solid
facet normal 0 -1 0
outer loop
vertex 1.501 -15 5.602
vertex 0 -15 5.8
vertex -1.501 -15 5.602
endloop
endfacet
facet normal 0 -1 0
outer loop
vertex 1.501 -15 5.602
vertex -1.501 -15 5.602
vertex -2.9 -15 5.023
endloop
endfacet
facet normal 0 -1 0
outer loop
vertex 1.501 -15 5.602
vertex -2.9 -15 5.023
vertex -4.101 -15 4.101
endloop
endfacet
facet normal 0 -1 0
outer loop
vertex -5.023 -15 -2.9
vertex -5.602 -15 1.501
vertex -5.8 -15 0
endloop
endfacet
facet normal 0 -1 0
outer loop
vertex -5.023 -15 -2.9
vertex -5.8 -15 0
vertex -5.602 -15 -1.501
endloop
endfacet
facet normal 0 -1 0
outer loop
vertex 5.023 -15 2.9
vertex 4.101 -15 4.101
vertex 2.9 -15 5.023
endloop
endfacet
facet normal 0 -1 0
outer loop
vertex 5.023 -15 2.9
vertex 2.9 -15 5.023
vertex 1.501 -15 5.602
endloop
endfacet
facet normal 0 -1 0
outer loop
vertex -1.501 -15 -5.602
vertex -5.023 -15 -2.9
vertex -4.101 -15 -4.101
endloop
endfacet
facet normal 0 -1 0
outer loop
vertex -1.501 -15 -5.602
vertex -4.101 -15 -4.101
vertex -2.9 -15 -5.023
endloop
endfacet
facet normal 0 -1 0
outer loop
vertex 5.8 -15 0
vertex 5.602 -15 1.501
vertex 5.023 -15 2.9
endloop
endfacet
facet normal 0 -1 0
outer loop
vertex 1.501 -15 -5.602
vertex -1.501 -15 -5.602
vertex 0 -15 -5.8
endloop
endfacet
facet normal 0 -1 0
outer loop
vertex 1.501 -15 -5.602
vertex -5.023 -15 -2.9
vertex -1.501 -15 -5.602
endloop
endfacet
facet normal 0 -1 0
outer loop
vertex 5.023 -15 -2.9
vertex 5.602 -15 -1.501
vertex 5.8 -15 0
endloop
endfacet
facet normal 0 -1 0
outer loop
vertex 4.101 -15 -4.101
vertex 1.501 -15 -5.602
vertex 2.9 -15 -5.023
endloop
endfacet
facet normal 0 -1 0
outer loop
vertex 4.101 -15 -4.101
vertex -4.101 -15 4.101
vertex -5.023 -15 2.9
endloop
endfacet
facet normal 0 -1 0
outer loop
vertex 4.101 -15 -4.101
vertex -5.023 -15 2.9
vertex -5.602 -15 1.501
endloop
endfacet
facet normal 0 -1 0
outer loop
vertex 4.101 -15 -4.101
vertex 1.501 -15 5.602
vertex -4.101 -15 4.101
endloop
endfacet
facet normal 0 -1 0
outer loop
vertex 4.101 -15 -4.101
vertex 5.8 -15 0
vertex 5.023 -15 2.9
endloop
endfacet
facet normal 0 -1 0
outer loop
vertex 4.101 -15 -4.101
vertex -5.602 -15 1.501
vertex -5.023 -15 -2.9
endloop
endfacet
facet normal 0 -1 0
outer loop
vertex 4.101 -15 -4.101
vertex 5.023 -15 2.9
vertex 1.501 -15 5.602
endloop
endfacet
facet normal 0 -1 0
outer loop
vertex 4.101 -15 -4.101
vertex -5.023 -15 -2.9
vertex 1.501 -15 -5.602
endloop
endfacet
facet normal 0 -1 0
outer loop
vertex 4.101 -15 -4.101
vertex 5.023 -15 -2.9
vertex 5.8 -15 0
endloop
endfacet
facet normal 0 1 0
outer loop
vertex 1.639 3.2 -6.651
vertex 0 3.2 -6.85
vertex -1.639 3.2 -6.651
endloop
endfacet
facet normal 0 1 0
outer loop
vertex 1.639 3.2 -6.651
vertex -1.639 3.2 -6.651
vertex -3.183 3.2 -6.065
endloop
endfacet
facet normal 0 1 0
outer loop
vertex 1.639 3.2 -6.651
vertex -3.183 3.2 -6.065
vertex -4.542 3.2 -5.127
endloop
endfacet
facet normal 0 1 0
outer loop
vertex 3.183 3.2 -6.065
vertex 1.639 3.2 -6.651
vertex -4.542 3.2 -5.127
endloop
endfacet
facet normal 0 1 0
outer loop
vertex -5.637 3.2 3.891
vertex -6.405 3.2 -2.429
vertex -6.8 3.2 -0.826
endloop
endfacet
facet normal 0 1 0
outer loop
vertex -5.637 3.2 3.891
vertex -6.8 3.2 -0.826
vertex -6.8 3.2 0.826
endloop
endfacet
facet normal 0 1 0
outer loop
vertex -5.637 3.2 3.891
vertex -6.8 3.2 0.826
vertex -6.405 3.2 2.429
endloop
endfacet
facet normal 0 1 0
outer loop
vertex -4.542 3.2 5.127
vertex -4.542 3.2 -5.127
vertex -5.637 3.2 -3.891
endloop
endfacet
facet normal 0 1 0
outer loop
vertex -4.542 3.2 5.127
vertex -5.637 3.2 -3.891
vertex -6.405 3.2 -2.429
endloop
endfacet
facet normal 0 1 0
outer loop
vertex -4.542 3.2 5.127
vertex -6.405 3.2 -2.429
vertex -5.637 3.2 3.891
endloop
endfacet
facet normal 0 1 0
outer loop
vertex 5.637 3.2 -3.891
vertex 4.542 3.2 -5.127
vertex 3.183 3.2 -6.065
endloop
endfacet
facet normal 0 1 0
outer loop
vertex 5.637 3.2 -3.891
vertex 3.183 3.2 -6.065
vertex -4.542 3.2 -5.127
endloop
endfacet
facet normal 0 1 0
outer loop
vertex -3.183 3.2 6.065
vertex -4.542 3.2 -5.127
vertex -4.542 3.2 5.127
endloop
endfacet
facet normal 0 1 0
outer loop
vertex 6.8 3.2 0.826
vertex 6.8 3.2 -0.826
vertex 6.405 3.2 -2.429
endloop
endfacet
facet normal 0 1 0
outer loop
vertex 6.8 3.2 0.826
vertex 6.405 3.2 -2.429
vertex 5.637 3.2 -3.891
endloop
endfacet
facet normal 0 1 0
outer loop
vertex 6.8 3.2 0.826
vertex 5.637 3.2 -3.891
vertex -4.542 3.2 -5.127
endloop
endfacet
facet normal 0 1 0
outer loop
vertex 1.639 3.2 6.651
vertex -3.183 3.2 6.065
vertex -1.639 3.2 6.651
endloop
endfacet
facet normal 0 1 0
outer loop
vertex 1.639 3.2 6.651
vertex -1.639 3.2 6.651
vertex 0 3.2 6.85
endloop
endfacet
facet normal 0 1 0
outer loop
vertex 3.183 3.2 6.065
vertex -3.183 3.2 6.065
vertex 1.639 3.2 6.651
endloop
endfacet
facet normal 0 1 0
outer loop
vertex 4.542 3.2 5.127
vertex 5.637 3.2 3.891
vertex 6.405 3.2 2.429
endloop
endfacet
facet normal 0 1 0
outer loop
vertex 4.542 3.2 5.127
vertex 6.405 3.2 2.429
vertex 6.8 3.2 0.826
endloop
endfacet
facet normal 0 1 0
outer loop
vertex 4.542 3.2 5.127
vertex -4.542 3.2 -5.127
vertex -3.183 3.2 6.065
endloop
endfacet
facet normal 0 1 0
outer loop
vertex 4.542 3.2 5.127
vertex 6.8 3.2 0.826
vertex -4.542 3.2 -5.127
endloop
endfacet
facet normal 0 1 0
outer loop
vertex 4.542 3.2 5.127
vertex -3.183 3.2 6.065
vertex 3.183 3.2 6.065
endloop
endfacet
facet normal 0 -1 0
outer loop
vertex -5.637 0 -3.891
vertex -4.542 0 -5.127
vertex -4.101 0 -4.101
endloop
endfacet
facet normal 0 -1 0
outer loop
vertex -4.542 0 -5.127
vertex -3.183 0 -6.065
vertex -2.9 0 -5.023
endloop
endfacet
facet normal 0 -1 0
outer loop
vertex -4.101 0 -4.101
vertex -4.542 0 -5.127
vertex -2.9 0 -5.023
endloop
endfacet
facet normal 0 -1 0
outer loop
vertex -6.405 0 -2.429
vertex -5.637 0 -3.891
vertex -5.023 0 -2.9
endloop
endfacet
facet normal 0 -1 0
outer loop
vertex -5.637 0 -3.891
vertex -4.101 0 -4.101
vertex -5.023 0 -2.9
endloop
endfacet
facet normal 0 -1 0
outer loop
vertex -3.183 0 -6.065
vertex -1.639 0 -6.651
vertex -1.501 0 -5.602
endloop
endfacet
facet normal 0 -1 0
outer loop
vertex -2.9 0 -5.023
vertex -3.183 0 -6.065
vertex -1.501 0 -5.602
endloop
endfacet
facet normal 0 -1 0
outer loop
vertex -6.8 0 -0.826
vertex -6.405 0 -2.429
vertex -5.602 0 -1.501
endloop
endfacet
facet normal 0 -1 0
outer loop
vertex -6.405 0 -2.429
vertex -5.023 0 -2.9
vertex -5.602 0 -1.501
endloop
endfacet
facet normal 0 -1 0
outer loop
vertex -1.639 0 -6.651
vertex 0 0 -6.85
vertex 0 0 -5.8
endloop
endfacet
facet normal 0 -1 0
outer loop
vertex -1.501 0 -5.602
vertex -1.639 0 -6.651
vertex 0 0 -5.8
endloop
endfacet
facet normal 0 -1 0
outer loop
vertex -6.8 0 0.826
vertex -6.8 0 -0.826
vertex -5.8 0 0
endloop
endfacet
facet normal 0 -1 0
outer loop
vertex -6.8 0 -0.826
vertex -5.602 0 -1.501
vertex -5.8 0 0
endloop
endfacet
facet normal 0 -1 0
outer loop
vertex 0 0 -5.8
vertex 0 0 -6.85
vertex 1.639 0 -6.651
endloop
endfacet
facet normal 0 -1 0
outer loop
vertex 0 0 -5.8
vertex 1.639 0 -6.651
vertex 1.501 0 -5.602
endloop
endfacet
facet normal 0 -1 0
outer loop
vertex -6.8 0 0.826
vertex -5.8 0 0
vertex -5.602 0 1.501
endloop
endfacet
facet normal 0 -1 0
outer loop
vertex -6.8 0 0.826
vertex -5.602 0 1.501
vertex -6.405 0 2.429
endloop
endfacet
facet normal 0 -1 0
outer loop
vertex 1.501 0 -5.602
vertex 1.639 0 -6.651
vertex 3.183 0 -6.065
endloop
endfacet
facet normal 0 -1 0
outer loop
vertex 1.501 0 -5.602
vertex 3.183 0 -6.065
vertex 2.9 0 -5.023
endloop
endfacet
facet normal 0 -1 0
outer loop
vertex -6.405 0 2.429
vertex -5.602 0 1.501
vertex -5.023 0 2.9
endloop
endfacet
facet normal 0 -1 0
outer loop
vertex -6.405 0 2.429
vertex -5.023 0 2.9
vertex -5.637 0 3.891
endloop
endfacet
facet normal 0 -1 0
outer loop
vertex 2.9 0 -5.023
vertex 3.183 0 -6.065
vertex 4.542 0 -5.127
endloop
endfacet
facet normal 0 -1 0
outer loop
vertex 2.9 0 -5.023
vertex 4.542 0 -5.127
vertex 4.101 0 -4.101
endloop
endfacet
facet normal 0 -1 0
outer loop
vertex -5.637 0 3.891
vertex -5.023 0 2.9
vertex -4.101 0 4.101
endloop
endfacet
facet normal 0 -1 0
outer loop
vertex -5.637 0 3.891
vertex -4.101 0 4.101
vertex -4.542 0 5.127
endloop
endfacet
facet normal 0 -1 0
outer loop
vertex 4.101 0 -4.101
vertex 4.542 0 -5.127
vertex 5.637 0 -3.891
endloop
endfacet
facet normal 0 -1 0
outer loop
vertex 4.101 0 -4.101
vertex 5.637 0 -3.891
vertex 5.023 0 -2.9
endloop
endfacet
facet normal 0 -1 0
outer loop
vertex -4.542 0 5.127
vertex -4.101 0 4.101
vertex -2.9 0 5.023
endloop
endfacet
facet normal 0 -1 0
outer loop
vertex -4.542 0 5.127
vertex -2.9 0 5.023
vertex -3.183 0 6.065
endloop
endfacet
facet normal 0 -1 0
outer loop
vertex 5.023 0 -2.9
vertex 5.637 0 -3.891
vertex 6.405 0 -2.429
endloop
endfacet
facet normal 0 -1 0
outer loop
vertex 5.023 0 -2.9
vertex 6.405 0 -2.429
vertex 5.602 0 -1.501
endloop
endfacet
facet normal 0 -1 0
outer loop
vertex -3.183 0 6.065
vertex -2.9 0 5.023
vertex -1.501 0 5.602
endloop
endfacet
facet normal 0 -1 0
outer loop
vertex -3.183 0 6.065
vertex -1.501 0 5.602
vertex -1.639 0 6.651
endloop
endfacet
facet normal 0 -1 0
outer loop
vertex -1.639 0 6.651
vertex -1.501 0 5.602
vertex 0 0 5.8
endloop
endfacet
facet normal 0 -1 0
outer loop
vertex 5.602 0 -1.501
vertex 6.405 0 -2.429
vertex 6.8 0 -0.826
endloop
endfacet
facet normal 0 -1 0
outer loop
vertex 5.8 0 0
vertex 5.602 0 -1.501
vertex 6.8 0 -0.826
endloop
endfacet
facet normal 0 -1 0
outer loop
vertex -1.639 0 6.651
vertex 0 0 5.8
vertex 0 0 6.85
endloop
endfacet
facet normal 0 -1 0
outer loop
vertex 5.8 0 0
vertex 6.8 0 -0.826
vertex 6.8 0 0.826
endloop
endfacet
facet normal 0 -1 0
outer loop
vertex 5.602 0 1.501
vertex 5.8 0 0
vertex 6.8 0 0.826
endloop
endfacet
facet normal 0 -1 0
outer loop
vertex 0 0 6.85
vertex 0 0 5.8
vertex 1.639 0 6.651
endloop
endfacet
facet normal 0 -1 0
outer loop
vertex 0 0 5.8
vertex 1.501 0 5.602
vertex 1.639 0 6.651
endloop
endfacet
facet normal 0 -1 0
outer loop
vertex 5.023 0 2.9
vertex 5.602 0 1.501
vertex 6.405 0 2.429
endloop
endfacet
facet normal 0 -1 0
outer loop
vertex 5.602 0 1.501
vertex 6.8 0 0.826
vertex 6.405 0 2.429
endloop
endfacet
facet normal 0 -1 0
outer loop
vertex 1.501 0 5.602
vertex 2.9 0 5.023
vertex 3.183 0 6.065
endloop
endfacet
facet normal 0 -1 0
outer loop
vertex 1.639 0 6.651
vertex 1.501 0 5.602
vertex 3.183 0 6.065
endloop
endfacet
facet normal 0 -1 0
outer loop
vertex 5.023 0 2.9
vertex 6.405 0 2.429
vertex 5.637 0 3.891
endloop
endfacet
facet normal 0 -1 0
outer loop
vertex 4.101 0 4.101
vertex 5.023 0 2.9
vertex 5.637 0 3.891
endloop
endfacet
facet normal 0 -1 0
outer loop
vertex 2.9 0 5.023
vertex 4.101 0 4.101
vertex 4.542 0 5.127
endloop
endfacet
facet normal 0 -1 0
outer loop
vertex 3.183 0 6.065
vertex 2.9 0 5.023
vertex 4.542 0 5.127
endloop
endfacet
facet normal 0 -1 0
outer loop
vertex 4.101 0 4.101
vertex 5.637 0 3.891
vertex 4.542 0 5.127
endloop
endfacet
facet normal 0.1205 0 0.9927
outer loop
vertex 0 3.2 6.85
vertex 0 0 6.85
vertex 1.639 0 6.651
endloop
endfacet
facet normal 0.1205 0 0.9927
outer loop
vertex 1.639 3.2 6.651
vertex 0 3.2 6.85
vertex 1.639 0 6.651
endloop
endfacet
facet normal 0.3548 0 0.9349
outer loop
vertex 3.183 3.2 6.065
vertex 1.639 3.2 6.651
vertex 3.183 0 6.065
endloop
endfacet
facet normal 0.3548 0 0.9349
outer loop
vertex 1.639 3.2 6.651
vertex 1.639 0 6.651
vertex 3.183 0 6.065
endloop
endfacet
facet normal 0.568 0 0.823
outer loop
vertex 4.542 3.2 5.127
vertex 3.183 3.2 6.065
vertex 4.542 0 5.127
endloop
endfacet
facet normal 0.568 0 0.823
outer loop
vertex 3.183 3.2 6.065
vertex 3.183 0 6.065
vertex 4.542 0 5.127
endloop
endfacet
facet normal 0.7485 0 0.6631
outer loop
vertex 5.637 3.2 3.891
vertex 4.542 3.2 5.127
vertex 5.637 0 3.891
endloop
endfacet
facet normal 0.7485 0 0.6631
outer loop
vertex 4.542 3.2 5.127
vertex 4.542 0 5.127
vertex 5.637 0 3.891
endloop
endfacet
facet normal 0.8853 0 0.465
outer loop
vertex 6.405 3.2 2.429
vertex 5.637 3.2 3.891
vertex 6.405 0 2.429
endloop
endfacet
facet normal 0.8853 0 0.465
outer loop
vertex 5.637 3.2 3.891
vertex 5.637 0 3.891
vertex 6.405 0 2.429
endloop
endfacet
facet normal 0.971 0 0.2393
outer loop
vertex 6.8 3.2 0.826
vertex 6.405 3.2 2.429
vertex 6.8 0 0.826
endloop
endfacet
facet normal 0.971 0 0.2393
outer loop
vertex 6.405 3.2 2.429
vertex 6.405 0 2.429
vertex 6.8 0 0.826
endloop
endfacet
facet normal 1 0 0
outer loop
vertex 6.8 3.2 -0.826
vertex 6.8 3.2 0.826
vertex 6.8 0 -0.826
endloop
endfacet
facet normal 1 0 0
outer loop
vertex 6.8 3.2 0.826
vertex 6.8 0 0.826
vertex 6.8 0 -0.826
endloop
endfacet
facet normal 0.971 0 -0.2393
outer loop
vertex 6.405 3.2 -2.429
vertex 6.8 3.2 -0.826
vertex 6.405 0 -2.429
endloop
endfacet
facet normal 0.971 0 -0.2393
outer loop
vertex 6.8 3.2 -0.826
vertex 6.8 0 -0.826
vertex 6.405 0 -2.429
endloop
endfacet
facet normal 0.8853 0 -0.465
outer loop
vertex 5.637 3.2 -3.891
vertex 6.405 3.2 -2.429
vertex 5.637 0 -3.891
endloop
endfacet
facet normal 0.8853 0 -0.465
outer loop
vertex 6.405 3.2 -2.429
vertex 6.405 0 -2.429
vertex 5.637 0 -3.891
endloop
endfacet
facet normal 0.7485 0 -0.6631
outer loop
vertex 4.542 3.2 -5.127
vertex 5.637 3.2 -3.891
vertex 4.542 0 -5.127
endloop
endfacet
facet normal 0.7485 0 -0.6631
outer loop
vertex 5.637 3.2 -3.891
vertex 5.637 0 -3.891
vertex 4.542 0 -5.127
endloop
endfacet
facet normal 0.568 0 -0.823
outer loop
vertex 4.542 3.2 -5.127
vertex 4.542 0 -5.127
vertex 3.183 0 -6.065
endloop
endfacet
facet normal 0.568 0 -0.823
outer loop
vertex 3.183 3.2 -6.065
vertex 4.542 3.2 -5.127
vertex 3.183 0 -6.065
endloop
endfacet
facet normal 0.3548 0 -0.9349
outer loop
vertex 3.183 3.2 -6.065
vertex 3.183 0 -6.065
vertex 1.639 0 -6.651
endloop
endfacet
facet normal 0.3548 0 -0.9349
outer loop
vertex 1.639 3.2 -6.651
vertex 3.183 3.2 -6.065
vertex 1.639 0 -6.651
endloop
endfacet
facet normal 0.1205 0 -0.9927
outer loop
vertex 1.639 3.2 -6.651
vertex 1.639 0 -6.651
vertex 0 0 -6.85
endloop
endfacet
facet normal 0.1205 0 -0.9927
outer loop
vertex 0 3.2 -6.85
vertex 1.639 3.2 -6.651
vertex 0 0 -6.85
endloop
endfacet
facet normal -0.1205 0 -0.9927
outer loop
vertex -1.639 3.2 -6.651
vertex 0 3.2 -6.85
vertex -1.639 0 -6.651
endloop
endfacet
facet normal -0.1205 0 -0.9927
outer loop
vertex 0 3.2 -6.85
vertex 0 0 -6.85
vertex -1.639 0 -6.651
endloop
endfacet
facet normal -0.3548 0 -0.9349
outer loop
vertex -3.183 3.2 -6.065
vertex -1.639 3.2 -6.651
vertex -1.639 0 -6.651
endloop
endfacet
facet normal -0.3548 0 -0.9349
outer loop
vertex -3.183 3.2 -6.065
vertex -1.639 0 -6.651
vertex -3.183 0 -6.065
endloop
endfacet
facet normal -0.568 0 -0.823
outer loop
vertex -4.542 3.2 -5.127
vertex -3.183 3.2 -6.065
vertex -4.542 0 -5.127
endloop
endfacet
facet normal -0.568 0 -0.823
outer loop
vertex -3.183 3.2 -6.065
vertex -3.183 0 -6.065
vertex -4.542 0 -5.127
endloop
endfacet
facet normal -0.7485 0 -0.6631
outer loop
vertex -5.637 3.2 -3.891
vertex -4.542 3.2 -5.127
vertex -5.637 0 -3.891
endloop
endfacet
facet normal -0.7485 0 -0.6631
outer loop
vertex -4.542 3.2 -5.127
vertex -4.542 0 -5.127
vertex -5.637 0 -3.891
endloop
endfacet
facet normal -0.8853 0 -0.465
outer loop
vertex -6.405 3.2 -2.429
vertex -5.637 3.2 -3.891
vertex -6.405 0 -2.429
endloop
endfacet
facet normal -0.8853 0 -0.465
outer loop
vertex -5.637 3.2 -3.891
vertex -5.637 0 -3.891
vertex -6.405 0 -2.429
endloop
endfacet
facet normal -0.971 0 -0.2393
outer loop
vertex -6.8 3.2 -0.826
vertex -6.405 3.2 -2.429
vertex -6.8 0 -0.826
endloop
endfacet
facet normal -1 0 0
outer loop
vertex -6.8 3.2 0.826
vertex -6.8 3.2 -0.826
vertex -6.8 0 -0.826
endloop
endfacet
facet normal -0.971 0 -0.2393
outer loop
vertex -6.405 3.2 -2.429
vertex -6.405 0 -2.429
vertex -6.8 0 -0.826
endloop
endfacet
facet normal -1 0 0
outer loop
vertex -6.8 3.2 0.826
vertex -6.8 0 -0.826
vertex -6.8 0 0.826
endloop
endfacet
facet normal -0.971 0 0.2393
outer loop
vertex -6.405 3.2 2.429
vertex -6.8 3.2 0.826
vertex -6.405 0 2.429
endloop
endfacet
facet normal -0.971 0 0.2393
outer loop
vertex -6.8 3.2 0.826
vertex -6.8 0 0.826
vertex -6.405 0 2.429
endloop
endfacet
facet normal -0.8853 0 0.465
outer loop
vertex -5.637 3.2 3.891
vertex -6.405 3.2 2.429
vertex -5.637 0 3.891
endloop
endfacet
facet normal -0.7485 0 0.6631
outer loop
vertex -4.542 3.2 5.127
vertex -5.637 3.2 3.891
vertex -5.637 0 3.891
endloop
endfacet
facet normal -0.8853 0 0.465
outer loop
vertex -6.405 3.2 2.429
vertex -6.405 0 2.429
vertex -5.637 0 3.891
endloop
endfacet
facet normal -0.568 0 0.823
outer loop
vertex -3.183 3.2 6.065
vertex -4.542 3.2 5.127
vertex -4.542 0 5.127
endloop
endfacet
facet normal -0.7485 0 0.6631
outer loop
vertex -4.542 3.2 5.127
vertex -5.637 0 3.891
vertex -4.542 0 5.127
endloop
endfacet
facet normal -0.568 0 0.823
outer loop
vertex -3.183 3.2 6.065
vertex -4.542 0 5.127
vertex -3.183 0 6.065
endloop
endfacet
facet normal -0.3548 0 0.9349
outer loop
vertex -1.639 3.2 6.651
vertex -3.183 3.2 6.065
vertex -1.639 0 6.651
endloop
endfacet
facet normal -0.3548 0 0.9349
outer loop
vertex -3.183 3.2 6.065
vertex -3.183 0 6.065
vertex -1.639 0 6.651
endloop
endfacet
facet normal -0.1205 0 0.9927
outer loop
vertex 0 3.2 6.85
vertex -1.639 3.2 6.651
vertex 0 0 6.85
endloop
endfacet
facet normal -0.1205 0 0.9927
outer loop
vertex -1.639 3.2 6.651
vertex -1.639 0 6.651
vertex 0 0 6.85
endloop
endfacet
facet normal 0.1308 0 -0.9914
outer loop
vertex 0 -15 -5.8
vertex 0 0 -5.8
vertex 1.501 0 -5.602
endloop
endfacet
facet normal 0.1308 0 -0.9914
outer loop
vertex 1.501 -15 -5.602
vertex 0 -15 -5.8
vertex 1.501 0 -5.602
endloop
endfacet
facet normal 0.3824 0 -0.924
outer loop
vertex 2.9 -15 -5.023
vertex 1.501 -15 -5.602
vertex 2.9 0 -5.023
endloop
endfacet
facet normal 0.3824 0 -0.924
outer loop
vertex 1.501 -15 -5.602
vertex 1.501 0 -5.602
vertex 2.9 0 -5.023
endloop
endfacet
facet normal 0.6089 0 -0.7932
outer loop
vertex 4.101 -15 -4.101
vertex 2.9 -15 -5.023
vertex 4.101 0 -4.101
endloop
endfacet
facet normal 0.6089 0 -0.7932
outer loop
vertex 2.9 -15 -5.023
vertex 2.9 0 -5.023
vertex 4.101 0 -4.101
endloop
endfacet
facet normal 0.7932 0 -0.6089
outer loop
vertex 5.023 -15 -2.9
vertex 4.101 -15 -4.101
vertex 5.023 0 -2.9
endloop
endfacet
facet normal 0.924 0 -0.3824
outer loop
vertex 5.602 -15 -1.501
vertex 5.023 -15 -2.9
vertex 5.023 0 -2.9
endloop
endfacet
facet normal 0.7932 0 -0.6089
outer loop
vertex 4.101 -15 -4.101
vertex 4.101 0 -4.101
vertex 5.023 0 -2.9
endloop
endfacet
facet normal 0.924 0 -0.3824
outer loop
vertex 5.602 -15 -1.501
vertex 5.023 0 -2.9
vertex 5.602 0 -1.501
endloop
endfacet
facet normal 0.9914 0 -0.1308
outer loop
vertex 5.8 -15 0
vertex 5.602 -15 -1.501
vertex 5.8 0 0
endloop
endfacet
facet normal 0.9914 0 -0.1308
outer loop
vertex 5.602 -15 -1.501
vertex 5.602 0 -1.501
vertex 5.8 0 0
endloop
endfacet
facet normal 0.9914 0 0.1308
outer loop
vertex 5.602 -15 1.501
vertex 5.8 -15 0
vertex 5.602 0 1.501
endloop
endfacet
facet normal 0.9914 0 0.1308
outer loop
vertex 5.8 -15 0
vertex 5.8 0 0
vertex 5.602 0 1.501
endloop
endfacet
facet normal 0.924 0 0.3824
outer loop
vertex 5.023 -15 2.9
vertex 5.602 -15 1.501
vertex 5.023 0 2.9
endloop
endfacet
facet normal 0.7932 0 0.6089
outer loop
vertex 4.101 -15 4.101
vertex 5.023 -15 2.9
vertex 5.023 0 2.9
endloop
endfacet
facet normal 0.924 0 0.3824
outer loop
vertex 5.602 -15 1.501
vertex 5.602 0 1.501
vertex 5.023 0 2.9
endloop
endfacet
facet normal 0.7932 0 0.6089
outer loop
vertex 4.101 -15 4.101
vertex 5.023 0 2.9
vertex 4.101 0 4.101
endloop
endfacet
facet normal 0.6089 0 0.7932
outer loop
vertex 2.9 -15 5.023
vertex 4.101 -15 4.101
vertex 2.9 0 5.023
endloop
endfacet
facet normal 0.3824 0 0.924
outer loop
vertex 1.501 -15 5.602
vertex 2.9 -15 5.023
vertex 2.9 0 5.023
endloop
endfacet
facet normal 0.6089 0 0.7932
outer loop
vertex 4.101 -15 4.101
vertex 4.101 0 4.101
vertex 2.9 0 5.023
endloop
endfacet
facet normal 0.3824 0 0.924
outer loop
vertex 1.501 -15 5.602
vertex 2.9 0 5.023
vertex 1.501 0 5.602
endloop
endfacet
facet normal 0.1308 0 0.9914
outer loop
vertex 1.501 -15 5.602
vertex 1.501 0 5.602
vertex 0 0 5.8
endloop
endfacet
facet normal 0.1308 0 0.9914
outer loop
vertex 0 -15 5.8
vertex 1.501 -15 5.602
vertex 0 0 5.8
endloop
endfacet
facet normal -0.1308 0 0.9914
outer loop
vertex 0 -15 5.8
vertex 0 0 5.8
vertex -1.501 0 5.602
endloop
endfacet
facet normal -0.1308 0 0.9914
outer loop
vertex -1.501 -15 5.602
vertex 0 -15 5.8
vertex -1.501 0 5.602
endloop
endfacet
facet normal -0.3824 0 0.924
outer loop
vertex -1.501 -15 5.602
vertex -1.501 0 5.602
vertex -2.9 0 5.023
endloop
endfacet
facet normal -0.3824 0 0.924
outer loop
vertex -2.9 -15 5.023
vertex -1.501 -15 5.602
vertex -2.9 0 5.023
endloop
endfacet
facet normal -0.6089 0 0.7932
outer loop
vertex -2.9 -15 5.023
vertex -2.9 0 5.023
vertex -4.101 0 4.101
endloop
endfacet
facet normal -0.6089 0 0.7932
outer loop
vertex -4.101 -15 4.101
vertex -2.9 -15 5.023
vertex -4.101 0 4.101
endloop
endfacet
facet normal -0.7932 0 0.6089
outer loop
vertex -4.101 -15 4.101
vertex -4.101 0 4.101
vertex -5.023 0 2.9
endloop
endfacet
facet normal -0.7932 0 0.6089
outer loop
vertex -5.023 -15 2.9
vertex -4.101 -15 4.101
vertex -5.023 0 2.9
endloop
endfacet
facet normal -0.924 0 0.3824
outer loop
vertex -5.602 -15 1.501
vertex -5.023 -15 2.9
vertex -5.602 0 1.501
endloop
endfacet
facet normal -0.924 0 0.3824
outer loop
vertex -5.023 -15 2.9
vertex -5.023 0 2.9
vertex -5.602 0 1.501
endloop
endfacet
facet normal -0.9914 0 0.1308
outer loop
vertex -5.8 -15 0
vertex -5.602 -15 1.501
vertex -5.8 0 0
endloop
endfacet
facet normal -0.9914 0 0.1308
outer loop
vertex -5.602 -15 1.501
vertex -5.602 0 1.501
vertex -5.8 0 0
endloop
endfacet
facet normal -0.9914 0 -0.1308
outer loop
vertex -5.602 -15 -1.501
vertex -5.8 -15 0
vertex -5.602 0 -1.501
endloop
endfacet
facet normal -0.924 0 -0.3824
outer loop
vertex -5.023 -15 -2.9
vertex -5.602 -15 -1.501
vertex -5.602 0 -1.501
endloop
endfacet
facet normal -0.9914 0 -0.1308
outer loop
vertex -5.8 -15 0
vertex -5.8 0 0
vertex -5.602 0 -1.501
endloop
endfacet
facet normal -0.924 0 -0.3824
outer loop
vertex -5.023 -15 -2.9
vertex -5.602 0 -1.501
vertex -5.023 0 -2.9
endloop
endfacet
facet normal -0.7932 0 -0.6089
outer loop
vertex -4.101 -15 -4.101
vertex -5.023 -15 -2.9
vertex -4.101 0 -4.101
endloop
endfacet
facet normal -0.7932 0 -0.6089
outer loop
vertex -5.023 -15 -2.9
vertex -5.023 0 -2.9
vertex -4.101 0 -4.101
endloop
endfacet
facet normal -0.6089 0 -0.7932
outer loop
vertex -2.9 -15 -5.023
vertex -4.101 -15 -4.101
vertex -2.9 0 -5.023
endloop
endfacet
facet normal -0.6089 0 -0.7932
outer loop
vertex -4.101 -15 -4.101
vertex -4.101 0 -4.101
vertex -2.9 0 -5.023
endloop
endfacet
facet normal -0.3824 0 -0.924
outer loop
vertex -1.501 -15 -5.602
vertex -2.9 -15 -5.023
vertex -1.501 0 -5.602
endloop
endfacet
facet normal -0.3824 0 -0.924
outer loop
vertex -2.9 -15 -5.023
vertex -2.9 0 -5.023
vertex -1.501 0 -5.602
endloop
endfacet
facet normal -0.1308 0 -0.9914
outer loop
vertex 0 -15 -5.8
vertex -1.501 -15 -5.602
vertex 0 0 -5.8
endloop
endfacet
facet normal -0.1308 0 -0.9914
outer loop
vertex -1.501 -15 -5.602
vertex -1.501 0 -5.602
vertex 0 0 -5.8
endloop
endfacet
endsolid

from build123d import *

# Parameters (mm, degrees)
ESBO_O1_R                = 6.85
RESSALTO_EXTRUS_O1_DEPTH = 3.2
ESBO_O3_R                = 5.8
RESSALTO_EXTRUS_O2_DEPTH = 15
ESBO_O3_2_R              = 5.8
RESSALTO_EXTRUS_O3_DEPTH = 15


with BuildPart() as part:
    # Esboço1 → Ressalto-extrusão1 (new body)
    with BuildSketch(Plane(origin=(0, 0, 0), x_dir=(1, 0, 0), z_dir=(0, 1, 0))):
        Circle(ESBO_O1_R)
    extrude(amount=RESSALTO_EXTRUS_O1_DEPTH)

    # Esboço3 → Ressalto-extrusão2 (add)
    with BuildSketch(Plane.XZ):
        Circle(ESBO_O3_R)
    extrude(amount=RESSALTO_EXTRUS_O2_DEPTH)

    # Esboço3<2> → Ressalto-extrusão3 (add)
    with BuildSketch(Plane.XZ):
        Circle(ESBO_O3_2_R)
    extrude(amount=RESSALTO_EXTRUS_O3_DEPTH)


solid = part.part
